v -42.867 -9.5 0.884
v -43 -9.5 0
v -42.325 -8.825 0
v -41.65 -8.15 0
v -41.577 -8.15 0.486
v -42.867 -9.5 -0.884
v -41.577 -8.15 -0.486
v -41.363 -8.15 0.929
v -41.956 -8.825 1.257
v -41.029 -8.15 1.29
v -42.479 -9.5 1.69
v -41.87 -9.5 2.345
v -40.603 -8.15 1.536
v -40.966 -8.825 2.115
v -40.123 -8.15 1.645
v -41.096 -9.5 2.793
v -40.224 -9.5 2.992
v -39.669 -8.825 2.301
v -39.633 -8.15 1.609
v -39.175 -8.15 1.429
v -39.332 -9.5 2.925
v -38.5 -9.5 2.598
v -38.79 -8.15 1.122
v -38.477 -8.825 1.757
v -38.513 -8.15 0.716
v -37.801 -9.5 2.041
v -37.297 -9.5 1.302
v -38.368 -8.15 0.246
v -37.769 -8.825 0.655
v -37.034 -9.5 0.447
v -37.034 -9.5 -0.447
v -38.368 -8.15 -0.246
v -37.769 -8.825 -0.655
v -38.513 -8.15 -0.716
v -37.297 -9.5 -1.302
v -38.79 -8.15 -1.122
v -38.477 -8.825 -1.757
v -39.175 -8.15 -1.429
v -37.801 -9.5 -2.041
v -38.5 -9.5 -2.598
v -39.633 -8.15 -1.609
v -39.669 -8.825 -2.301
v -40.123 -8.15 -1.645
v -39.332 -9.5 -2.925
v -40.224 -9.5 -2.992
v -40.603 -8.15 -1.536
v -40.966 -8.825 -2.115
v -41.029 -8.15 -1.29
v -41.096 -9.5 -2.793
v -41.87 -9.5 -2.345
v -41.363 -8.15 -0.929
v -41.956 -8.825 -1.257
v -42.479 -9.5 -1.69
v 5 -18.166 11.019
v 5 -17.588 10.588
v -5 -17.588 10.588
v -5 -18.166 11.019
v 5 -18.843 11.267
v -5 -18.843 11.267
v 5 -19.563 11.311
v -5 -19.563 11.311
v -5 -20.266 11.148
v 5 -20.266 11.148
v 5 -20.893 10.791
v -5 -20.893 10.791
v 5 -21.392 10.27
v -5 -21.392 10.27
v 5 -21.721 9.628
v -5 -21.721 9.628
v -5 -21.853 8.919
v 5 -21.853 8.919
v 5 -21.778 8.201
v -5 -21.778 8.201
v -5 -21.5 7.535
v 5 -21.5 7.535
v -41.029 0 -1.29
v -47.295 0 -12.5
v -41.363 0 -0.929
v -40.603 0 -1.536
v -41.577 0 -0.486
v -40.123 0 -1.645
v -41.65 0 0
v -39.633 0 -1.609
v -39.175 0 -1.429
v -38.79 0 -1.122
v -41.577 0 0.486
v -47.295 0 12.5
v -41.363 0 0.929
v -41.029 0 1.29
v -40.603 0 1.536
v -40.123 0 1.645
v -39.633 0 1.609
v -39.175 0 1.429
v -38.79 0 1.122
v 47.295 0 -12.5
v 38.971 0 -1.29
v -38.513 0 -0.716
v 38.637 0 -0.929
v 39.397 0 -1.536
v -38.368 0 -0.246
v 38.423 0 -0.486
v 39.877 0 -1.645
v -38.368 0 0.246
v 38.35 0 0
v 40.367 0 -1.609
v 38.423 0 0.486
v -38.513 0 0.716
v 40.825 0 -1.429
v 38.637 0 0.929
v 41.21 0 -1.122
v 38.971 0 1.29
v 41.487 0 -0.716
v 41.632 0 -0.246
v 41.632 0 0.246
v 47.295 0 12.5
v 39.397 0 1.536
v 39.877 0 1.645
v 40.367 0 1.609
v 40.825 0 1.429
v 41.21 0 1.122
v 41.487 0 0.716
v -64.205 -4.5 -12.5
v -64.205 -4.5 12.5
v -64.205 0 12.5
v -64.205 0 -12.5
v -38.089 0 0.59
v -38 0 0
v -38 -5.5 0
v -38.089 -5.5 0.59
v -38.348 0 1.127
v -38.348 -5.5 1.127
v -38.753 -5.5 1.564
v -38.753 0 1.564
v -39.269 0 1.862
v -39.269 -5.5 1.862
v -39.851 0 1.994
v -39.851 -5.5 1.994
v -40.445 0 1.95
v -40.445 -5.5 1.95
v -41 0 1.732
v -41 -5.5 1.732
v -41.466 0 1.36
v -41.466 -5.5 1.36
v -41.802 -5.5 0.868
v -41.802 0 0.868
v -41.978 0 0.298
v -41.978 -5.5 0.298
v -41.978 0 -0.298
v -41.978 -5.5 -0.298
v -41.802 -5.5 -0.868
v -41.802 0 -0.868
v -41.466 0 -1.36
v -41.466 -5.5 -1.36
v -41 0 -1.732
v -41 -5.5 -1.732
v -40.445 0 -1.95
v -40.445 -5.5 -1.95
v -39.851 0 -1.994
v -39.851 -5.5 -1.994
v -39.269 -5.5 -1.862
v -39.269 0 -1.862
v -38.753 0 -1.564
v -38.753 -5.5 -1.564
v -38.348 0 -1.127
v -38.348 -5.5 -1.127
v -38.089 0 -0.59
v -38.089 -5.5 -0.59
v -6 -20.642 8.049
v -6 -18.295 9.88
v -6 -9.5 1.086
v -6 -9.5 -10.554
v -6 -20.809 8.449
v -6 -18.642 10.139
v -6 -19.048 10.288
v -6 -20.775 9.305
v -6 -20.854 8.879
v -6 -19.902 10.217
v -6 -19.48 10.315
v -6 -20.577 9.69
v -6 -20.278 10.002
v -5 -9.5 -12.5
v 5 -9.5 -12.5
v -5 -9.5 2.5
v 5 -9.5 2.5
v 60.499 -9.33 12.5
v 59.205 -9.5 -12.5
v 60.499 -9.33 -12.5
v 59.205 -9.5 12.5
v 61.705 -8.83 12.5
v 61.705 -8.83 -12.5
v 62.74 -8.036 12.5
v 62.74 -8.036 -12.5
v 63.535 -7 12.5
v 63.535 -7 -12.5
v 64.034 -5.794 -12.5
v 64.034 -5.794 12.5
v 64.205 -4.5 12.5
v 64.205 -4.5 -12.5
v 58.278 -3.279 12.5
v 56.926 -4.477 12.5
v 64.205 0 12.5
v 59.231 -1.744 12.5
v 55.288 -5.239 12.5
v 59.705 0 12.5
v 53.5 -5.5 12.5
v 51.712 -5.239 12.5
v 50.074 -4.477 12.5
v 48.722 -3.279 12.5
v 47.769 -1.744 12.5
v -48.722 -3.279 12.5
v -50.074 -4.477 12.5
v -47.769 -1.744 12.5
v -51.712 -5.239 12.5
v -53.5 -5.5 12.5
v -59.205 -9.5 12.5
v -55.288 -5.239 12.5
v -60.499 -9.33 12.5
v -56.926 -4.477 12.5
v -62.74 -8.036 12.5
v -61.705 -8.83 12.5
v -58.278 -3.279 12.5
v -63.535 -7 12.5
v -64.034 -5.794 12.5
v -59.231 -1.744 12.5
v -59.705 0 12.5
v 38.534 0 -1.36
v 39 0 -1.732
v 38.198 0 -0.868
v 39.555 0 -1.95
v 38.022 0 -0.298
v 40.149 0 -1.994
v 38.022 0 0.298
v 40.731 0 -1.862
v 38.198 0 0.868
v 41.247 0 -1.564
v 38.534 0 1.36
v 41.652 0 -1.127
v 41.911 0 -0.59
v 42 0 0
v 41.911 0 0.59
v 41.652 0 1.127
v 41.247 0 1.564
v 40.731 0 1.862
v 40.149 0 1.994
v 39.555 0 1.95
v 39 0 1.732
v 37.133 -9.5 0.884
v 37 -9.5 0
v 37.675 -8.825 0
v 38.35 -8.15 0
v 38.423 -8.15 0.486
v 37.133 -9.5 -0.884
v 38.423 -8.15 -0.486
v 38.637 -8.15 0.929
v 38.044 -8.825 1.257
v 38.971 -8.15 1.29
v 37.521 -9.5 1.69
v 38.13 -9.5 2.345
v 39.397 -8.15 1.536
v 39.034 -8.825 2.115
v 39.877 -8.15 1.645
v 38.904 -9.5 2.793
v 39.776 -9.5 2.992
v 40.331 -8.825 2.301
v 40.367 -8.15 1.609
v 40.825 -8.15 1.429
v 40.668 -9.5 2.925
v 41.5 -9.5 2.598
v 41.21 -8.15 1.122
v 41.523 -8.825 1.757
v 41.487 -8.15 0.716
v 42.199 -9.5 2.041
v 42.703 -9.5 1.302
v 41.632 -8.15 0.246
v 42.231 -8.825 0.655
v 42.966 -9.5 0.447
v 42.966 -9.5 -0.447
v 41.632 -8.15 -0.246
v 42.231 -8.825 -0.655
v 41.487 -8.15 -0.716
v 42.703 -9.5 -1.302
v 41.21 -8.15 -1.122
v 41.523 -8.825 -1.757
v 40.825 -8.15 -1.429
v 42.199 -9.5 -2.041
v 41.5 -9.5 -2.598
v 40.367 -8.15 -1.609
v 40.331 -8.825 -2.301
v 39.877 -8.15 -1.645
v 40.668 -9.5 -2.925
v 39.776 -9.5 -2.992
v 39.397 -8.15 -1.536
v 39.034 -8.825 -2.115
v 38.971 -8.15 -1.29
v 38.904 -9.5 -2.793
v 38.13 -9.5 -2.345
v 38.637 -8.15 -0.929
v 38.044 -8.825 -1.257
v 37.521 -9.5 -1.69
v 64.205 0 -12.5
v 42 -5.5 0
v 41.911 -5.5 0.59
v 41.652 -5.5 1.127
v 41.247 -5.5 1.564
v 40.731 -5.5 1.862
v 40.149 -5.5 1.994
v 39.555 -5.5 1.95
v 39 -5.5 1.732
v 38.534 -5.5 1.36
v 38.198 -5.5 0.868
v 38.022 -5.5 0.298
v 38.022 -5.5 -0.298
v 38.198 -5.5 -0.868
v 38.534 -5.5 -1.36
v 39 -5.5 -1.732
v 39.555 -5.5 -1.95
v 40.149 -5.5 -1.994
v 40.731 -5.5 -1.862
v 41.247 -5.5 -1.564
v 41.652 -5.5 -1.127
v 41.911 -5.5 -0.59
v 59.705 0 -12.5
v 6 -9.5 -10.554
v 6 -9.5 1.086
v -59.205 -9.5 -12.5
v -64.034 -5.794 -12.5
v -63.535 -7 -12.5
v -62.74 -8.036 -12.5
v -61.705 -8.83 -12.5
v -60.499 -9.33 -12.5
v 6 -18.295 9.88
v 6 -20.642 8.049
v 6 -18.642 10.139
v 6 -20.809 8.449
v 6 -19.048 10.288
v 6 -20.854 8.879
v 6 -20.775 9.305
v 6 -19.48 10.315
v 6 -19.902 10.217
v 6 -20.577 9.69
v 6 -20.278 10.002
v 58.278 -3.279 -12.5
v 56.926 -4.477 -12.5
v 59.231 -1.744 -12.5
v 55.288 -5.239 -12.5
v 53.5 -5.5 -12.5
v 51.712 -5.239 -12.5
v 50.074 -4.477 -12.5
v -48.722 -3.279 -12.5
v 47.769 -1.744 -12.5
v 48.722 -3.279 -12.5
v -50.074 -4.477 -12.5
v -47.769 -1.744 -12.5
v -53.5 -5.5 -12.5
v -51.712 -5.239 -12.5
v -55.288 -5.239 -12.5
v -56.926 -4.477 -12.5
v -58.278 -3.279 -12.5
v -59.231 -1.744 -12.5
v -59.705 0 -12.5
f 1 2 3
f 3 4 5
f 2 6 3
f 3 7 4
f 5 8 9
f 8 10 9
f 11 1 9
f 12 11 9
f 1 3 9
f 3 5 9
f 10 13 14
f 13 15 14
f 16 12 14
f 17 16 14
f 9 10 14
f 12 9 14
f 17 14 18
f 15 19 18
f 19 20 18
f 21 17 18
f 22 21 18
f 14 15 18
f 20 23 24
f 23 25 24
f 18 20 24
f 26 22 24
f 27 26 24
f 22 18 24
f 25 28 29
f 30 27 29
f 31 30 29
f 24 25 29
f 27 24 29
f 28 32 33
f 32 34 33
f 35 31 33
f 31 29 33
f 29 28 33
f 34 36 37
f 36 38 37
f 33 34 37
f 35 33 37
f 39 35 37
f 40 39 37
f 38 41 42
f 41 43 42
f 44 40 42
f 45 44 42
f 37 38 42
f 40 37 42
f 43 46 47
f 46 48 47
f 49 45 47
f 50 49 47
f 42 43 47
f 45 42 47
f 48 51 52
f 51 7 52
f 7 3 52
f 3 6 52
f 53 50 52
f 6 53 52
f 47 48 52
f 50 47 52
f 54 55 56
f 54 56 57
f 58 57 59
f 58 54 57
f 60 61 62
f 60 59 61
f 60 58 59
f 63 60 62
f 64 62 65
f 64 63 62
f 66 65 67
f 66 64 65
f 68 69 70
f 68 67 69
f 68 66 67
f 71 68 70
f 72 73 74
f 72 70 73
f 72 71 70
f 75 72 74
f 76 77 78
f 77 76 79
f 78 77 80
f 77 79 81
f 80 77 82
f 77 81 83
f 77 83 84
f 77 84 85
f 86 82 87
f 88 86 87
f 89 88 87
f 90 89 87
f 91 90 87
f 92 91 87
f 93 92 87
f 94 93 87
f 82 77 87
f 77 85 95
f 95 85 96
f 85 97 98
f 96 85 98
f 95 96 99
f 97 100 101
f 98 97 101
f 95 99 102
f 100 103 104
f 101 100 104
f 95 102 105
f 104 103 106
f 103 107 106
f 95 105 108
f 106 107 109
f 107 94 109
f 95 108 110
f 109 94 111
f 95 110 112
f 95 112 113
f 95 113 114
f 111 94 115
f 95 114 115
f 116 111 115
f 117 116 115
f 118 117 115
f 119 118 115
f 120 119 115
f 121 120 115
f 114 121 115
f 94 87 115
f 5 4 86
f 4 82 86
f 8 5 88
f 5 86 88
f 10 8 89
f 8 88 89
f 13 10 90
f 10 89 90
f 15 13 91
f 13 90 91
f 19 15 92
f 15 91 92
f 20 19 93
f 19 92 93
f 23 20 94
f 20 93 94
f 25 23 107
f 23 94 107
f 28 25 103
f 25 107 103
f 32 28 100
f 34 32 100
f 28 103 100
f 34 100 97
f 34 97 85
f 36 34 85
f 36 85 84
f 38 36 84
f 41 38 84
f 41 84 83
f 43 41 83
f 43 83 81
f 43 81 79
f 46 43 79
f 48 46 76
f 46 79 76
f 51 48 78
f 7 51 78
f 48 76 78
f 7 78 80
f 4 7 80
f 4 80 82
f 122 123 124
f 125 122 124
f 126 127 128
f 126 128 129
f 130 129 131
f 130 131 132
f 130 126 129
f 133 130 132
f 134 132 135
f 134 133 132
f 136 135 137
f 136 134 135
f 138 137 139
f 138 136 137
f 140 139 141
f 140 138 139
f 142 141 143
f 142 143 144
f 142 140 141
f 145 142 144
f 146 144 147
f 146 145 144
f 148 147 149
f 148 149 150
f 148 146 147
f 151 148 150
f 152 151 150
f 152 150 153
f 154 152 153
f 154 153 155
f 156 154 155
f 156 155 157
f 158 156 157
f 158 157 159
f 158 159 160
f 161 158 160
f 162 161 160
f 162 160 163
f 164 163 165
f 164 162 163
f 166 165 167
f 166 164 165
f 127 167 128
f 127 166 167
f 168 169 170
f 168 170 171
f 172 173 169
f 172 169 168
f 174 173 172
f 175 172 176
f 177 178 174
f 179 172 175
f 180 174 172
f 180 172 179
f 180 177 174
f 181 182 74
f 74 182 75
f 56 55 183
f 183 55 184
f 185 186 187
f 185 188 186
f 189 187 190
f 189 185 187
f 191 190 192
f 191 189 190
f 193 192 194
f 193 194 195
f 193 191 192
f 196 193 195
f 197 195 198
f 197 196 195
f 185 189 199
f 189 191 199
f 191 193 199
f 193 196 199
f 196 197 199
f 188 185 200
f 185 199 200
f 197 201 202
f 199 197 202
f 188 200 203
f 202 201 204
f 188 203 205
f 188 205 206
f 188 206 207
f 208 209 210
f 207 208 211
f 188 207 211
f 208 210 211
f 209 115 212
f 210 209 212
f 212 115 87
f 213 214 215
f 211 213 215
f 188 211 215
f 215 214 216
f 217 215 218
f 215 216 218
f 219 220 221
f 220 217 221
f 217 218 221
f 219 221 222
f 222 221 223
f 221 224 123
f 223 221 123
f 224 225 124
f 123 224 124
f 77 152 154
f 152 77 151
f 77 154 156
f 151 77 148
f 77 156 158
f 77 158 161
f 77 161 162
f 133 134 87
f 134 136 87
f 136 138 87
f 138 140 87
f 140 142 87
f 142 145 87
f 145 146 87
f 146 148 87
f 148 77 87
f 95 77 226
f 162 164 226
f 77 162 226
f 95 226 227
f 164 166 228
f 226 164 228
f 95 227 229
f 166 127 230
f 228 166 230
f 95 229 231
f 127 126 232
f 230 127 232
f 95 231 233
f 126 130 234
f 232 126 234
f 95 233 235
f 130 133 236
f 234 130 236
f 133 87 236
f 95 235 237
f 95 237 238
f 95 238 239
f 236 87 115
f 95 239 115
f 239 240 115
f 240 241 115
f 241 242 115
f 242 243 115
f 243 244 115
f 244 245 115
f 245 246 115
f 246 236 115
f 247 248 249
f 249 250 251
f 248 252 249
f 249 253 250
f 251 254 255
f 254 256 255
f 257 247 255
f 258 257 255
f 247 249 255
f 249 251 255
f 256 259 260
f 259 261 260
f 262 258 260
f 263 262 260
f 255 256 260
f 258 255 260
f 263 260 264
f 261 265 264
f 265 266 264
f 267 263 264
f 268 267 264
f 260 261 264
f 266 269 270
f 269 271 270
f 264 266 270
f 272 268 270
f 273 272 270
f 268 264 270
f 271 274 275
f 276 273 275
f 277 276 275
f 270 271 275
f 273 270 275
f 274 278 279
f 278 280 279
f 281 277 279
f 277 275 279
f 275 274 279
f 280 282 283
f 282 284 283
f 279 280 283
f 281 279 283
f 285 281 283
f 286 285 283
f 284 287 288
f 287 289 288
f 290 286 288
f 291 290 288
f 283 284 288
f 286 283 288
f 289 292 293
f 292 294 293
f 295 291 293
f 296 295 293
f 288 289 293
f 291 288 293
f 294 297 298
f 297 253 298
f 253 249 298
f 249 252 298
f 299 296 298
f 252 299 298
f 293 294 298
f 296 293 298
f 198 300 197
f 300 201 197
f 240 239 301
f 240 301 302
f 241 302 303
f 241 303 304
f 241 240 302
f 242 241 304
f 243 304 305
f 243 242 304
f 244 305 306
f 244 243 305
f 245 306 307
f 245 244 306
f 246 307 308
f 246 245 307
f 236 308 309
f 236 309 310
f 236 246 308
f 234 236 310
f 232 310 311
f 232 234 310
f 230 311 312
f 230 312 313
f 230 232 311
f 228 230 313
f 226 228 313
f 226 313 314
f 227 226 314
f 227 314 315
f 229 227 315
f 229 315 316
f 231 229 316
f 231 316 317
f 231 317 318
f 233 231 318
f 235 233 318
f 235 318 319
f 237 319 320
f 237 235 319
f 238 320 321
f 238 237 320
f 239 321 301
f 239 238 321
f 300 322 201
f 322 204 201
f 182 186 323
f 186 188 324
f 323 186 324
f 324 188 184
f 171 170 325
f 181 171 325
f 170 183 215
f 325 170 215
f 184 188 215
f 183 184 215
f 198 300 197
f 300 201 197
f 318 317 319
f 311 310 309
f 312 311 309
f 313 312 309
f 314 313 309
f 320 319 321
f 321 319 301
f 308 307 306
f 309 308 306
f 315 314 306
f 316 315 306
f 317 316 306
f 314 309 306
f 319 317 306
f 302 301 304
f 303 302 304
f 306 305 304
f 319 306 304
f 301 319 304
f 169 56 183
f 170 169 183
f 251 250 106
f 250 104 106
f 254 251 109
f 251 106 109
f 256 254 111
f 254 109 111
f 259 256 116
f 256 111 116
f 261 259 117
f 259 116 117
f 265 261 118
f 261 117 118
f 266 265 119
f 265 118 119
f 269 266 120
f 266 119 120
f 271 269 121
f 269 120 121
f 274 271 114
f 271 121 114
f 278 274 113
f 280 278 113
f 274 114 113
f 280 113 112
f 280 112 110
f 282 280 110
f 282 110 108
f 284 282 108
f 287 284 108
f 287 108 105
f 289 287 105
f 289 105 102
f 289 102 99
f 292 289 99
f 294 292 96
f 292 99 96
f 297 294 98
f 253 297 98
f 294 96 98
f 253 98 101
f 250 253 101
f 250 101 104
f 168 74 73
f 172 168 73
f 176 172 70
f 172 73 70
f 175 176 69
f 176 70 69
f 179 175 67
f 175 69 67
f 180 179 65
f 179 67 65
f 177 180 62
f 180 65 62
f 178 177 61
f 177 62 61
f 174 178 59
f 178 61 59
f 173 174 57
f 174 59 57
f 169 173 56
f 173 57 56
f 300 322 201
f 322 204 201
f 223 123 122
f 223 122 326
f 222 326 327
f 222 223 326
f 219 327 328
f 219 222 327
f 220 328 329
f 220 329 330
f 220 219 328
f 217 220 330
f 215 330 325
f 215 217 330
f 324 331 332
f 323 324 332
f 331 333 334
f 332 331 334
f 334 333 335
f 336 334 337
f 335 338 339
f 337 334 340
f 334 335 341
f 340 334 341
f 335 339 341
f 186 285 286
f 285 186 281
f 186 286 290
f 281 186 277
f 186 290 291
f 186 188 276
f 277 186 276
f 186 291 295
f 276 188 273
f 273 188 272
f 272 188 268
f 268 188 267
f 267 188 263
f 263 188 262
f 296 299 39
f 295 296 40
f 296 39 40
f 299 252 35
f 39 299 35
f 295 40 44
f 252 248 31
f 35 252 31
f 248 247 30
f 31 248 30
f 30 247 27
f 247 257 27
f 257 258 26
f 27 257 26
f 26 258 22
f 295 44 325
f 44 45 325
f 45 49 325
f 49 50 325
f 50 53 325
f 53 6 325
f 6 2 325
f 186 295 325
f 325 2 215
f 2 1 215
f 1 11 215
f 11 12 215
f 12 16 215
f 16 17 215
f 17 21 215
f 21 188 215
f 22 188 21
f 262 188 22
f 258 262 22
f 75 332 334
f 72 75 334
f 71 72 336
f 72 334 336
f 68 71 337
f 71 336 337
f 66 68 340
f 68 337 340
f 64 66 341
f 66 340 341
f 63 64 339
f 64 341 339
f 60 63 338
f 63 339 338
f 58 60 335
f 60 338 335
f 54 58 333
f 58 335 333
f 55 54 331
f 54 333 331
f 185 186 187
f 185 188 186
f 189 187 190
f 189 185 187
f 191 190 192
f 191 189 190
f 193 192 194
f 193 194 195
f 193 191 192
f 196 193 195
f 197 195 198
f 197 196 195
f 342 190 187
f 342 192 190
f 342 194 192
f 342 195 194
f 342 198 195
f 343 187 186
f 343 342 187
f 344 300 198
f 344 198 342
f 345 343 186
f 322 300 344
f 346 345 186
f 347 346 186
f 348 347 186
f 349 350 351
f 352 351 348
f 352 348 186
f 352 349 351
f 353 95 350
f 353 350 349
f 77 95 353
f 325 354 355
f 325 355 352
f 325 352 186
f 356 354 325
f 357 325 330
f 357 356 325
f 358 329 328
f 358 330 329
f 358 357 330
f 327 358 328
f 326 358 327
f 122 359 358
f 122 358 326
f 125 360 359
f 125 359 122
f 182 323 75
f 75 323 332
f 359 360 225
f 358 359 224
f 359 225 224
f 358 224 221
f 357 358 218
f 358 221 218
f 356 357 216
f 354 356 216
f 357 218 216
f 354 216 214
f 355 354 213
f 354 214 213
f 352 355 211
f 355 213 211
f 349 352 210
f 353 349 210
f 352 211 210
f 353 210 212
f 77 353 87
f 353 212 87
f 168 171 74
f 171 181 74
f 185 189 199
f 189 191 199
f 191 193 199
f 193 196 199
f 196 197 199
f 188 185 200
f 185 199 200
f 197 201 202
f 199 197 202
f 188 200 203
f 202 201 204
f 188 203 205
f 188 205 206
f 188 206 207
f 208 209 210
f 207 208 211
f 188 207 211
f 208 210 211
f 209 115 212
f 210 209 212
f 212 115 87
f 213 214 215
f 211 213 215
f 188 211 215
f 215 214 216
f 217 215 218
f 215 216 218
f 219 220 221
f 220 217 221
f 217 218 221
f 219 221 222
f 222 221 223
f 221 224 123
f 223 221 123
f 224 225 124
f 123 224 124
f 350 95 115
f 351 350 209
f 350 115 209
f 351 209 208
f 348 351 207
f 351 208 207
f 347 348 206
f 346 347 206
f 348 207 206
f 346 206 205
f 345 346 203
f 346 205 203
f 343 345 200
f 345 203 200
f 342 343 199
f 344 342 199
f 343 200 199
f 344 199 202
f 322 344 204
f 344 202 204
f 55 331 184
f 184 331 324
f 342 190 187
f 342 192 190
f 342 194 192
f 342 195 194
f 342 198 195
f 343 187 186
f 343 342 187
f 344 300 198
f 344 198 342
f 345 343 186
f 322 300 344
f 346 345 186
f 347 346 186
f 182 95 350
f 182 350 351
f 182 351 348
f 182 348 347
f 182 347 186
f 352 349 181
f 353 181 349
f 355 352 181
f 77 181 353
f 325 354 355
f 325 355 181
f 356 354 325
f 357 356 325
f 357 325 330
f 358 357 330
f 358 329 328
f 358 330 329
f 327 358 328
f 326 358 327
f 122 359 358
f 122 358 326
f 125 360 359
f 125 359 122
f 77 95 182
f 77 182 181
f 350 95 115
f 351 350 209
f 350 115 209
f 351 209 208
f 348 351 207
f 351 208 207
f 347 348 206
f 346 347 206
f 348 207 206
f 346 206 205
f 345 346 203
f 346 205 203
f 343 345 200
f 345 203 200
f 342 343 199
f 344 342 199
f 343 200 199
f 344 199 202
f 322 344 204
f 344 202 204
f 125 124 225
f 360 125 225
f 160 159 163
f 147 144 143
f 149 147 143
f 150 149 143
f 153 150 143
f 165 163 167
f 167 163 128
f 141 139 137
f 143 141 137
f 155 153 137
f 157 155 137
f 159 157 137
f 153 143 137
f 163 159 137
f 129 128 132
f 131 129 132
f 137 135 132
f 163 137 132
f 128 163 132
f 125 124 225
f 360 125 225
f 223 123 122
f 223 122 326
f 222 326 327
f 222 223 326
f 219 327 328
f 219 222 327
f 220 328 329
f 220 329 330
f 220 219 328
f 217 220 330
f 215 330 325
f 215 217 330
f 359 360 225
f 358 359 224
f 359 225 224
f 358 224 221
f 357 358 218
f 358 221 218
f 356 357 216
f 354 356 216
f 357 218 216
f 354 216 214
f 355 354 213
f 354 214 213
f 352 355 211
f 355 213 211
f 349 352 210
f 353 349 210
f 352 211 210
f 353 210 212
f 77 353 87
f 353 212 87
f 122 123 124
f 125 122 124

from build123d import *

# Parameters (mm, degrees)
PAD_DEPTH           = 12.5
SKETCH001_R         = 2
HOLE_DEPTH          = 5.5
PAD001_DEPTH        = 6
CHAMFER_SIZE        = 1
PAD002_DEPTH        = 12.5
HOLE001_D           = 3.3
HOLE001_DEPTH       = 25
HOLE001_CSINK_D     = 6
HOLE001_CSINK_ANGLE = 90


with BuildPart() as body_haken:
    # Sketch → Pad (new body, symmetric)
    with BuildSketch(Plane.XY):
        with BuildLine():
            Line((-64.204837, 0), (-59.704837, 0))
            ThreePointArc((-59.704837, 0), (-53.5, -5.5), (-47.295163, 0))
            Line((-47.295163, 0), (47.295163, 0))
            ThreePointArc((47.295163, 0), (53.5, -5.5), (59.704837, 0))
            Line((59.704837, 0), (64.204837, 0))
            Line((64.204837, 0), (64.204837, -4.5))
            ThreePointArc((59.204837, -9.5), (62.740371, -8.035534), (64.204837, -4.5))
            Line((59.204837, -9.5), (-59.204837, -9.5))
            ThreePointArc((-64.204837, -4.5), (-62.740371, -8.035534), (-59.204837, -9.5))
            Line((-64.204837, -4.5), (-64.204837, 0))
        make_face()
    extrude(amount=PAD_DEPTH, both=True)

    # Sketch001 → Hole (cut)
    with BuildSketch(Plane.XZ):
        with Locations((-40, 0)):
            Circle(SKETCH001_R)
        with Locations((40, 0)):
            Circle(SKETCH001_R)
    extrude(amount=HOLE_DEPTH, mode=Mode.SUBTRACT)

    # Sketch002 → Pad001 (join, symmetric)
    with BuildSketch(Plane.YZ):
        with BuildLine():
            Line((-9.5, -12.5), (-21.5, 7.53516))
            ThreePointArc((-17.587505, 10.587505), (-20.893039, 10.790847), (-21.5, 7.53516))
            Line((-17.587505, 10.587505), (-9.5, 2.5))
            Line((-9.5, 2.5), (-9.5, -12.5))
        make_face()
    extrude(amount=PAD001_DEPTH, both=True)

    # Chamfer
    chamfer_edges = [body_haken.edges().sort_by_distance(p)[0] for p in [
        (6, -13.543753, 6.543753),
        (-6, -13.543753, 6.543753),
    ]]
    chamfer(chamfer_edges, length=CHAMFER_SIZE)


with BuildPart() as body_rueckseite:
    # Sketch003 → Pad002 (new body, symmetric)
    with BuildSketch(Plane.XY):
        with BuildLine():
            Line((-64.204837, 0), (-59.704837, 0))
            ThreePointArc((-59.704837, 0), (-53.5, -5.5), (-47.295163, 0))
            Line((-47.295163, 0), (47.295163, 0))
            ThreePointArc((47.295163, 0), (53.5, -5.5), (59.704837, 0))
            Line((59.704837, 0), (64.204837, 0))
            Line((64.204837, 0), (64.204837, -4.5))
            ThreePointArc((59.204837, -9.5), (62.740371, -8.035534), (64.204837, -4.5))
            Line((59.204837, -9.5), (-59.204837, -9.5))
            ThreePointArc((-64.204837, -4.5), (-62.740371, -8.035534), (-59.204837, -9.5))
            Line((-64.204837, -4.5), (-64.204837, 0))
        make_face()
    extrude(amount=PAD002_DEPTH, both=True)

    # Hole001
    with Locations(Plane.XZ.offset(9.5)):
        with Locations((-40, 0), (40, 0)):
            CounterSinkHole(HOLE001_D / 2, HOLE001_CSINK_D / 2, depth=HOLE001_DEPTH, counter_sink_angle=HOLE001_CSINK_ANGLE)


solid = Compound([body_haken.part, body_rueckseite.part])
